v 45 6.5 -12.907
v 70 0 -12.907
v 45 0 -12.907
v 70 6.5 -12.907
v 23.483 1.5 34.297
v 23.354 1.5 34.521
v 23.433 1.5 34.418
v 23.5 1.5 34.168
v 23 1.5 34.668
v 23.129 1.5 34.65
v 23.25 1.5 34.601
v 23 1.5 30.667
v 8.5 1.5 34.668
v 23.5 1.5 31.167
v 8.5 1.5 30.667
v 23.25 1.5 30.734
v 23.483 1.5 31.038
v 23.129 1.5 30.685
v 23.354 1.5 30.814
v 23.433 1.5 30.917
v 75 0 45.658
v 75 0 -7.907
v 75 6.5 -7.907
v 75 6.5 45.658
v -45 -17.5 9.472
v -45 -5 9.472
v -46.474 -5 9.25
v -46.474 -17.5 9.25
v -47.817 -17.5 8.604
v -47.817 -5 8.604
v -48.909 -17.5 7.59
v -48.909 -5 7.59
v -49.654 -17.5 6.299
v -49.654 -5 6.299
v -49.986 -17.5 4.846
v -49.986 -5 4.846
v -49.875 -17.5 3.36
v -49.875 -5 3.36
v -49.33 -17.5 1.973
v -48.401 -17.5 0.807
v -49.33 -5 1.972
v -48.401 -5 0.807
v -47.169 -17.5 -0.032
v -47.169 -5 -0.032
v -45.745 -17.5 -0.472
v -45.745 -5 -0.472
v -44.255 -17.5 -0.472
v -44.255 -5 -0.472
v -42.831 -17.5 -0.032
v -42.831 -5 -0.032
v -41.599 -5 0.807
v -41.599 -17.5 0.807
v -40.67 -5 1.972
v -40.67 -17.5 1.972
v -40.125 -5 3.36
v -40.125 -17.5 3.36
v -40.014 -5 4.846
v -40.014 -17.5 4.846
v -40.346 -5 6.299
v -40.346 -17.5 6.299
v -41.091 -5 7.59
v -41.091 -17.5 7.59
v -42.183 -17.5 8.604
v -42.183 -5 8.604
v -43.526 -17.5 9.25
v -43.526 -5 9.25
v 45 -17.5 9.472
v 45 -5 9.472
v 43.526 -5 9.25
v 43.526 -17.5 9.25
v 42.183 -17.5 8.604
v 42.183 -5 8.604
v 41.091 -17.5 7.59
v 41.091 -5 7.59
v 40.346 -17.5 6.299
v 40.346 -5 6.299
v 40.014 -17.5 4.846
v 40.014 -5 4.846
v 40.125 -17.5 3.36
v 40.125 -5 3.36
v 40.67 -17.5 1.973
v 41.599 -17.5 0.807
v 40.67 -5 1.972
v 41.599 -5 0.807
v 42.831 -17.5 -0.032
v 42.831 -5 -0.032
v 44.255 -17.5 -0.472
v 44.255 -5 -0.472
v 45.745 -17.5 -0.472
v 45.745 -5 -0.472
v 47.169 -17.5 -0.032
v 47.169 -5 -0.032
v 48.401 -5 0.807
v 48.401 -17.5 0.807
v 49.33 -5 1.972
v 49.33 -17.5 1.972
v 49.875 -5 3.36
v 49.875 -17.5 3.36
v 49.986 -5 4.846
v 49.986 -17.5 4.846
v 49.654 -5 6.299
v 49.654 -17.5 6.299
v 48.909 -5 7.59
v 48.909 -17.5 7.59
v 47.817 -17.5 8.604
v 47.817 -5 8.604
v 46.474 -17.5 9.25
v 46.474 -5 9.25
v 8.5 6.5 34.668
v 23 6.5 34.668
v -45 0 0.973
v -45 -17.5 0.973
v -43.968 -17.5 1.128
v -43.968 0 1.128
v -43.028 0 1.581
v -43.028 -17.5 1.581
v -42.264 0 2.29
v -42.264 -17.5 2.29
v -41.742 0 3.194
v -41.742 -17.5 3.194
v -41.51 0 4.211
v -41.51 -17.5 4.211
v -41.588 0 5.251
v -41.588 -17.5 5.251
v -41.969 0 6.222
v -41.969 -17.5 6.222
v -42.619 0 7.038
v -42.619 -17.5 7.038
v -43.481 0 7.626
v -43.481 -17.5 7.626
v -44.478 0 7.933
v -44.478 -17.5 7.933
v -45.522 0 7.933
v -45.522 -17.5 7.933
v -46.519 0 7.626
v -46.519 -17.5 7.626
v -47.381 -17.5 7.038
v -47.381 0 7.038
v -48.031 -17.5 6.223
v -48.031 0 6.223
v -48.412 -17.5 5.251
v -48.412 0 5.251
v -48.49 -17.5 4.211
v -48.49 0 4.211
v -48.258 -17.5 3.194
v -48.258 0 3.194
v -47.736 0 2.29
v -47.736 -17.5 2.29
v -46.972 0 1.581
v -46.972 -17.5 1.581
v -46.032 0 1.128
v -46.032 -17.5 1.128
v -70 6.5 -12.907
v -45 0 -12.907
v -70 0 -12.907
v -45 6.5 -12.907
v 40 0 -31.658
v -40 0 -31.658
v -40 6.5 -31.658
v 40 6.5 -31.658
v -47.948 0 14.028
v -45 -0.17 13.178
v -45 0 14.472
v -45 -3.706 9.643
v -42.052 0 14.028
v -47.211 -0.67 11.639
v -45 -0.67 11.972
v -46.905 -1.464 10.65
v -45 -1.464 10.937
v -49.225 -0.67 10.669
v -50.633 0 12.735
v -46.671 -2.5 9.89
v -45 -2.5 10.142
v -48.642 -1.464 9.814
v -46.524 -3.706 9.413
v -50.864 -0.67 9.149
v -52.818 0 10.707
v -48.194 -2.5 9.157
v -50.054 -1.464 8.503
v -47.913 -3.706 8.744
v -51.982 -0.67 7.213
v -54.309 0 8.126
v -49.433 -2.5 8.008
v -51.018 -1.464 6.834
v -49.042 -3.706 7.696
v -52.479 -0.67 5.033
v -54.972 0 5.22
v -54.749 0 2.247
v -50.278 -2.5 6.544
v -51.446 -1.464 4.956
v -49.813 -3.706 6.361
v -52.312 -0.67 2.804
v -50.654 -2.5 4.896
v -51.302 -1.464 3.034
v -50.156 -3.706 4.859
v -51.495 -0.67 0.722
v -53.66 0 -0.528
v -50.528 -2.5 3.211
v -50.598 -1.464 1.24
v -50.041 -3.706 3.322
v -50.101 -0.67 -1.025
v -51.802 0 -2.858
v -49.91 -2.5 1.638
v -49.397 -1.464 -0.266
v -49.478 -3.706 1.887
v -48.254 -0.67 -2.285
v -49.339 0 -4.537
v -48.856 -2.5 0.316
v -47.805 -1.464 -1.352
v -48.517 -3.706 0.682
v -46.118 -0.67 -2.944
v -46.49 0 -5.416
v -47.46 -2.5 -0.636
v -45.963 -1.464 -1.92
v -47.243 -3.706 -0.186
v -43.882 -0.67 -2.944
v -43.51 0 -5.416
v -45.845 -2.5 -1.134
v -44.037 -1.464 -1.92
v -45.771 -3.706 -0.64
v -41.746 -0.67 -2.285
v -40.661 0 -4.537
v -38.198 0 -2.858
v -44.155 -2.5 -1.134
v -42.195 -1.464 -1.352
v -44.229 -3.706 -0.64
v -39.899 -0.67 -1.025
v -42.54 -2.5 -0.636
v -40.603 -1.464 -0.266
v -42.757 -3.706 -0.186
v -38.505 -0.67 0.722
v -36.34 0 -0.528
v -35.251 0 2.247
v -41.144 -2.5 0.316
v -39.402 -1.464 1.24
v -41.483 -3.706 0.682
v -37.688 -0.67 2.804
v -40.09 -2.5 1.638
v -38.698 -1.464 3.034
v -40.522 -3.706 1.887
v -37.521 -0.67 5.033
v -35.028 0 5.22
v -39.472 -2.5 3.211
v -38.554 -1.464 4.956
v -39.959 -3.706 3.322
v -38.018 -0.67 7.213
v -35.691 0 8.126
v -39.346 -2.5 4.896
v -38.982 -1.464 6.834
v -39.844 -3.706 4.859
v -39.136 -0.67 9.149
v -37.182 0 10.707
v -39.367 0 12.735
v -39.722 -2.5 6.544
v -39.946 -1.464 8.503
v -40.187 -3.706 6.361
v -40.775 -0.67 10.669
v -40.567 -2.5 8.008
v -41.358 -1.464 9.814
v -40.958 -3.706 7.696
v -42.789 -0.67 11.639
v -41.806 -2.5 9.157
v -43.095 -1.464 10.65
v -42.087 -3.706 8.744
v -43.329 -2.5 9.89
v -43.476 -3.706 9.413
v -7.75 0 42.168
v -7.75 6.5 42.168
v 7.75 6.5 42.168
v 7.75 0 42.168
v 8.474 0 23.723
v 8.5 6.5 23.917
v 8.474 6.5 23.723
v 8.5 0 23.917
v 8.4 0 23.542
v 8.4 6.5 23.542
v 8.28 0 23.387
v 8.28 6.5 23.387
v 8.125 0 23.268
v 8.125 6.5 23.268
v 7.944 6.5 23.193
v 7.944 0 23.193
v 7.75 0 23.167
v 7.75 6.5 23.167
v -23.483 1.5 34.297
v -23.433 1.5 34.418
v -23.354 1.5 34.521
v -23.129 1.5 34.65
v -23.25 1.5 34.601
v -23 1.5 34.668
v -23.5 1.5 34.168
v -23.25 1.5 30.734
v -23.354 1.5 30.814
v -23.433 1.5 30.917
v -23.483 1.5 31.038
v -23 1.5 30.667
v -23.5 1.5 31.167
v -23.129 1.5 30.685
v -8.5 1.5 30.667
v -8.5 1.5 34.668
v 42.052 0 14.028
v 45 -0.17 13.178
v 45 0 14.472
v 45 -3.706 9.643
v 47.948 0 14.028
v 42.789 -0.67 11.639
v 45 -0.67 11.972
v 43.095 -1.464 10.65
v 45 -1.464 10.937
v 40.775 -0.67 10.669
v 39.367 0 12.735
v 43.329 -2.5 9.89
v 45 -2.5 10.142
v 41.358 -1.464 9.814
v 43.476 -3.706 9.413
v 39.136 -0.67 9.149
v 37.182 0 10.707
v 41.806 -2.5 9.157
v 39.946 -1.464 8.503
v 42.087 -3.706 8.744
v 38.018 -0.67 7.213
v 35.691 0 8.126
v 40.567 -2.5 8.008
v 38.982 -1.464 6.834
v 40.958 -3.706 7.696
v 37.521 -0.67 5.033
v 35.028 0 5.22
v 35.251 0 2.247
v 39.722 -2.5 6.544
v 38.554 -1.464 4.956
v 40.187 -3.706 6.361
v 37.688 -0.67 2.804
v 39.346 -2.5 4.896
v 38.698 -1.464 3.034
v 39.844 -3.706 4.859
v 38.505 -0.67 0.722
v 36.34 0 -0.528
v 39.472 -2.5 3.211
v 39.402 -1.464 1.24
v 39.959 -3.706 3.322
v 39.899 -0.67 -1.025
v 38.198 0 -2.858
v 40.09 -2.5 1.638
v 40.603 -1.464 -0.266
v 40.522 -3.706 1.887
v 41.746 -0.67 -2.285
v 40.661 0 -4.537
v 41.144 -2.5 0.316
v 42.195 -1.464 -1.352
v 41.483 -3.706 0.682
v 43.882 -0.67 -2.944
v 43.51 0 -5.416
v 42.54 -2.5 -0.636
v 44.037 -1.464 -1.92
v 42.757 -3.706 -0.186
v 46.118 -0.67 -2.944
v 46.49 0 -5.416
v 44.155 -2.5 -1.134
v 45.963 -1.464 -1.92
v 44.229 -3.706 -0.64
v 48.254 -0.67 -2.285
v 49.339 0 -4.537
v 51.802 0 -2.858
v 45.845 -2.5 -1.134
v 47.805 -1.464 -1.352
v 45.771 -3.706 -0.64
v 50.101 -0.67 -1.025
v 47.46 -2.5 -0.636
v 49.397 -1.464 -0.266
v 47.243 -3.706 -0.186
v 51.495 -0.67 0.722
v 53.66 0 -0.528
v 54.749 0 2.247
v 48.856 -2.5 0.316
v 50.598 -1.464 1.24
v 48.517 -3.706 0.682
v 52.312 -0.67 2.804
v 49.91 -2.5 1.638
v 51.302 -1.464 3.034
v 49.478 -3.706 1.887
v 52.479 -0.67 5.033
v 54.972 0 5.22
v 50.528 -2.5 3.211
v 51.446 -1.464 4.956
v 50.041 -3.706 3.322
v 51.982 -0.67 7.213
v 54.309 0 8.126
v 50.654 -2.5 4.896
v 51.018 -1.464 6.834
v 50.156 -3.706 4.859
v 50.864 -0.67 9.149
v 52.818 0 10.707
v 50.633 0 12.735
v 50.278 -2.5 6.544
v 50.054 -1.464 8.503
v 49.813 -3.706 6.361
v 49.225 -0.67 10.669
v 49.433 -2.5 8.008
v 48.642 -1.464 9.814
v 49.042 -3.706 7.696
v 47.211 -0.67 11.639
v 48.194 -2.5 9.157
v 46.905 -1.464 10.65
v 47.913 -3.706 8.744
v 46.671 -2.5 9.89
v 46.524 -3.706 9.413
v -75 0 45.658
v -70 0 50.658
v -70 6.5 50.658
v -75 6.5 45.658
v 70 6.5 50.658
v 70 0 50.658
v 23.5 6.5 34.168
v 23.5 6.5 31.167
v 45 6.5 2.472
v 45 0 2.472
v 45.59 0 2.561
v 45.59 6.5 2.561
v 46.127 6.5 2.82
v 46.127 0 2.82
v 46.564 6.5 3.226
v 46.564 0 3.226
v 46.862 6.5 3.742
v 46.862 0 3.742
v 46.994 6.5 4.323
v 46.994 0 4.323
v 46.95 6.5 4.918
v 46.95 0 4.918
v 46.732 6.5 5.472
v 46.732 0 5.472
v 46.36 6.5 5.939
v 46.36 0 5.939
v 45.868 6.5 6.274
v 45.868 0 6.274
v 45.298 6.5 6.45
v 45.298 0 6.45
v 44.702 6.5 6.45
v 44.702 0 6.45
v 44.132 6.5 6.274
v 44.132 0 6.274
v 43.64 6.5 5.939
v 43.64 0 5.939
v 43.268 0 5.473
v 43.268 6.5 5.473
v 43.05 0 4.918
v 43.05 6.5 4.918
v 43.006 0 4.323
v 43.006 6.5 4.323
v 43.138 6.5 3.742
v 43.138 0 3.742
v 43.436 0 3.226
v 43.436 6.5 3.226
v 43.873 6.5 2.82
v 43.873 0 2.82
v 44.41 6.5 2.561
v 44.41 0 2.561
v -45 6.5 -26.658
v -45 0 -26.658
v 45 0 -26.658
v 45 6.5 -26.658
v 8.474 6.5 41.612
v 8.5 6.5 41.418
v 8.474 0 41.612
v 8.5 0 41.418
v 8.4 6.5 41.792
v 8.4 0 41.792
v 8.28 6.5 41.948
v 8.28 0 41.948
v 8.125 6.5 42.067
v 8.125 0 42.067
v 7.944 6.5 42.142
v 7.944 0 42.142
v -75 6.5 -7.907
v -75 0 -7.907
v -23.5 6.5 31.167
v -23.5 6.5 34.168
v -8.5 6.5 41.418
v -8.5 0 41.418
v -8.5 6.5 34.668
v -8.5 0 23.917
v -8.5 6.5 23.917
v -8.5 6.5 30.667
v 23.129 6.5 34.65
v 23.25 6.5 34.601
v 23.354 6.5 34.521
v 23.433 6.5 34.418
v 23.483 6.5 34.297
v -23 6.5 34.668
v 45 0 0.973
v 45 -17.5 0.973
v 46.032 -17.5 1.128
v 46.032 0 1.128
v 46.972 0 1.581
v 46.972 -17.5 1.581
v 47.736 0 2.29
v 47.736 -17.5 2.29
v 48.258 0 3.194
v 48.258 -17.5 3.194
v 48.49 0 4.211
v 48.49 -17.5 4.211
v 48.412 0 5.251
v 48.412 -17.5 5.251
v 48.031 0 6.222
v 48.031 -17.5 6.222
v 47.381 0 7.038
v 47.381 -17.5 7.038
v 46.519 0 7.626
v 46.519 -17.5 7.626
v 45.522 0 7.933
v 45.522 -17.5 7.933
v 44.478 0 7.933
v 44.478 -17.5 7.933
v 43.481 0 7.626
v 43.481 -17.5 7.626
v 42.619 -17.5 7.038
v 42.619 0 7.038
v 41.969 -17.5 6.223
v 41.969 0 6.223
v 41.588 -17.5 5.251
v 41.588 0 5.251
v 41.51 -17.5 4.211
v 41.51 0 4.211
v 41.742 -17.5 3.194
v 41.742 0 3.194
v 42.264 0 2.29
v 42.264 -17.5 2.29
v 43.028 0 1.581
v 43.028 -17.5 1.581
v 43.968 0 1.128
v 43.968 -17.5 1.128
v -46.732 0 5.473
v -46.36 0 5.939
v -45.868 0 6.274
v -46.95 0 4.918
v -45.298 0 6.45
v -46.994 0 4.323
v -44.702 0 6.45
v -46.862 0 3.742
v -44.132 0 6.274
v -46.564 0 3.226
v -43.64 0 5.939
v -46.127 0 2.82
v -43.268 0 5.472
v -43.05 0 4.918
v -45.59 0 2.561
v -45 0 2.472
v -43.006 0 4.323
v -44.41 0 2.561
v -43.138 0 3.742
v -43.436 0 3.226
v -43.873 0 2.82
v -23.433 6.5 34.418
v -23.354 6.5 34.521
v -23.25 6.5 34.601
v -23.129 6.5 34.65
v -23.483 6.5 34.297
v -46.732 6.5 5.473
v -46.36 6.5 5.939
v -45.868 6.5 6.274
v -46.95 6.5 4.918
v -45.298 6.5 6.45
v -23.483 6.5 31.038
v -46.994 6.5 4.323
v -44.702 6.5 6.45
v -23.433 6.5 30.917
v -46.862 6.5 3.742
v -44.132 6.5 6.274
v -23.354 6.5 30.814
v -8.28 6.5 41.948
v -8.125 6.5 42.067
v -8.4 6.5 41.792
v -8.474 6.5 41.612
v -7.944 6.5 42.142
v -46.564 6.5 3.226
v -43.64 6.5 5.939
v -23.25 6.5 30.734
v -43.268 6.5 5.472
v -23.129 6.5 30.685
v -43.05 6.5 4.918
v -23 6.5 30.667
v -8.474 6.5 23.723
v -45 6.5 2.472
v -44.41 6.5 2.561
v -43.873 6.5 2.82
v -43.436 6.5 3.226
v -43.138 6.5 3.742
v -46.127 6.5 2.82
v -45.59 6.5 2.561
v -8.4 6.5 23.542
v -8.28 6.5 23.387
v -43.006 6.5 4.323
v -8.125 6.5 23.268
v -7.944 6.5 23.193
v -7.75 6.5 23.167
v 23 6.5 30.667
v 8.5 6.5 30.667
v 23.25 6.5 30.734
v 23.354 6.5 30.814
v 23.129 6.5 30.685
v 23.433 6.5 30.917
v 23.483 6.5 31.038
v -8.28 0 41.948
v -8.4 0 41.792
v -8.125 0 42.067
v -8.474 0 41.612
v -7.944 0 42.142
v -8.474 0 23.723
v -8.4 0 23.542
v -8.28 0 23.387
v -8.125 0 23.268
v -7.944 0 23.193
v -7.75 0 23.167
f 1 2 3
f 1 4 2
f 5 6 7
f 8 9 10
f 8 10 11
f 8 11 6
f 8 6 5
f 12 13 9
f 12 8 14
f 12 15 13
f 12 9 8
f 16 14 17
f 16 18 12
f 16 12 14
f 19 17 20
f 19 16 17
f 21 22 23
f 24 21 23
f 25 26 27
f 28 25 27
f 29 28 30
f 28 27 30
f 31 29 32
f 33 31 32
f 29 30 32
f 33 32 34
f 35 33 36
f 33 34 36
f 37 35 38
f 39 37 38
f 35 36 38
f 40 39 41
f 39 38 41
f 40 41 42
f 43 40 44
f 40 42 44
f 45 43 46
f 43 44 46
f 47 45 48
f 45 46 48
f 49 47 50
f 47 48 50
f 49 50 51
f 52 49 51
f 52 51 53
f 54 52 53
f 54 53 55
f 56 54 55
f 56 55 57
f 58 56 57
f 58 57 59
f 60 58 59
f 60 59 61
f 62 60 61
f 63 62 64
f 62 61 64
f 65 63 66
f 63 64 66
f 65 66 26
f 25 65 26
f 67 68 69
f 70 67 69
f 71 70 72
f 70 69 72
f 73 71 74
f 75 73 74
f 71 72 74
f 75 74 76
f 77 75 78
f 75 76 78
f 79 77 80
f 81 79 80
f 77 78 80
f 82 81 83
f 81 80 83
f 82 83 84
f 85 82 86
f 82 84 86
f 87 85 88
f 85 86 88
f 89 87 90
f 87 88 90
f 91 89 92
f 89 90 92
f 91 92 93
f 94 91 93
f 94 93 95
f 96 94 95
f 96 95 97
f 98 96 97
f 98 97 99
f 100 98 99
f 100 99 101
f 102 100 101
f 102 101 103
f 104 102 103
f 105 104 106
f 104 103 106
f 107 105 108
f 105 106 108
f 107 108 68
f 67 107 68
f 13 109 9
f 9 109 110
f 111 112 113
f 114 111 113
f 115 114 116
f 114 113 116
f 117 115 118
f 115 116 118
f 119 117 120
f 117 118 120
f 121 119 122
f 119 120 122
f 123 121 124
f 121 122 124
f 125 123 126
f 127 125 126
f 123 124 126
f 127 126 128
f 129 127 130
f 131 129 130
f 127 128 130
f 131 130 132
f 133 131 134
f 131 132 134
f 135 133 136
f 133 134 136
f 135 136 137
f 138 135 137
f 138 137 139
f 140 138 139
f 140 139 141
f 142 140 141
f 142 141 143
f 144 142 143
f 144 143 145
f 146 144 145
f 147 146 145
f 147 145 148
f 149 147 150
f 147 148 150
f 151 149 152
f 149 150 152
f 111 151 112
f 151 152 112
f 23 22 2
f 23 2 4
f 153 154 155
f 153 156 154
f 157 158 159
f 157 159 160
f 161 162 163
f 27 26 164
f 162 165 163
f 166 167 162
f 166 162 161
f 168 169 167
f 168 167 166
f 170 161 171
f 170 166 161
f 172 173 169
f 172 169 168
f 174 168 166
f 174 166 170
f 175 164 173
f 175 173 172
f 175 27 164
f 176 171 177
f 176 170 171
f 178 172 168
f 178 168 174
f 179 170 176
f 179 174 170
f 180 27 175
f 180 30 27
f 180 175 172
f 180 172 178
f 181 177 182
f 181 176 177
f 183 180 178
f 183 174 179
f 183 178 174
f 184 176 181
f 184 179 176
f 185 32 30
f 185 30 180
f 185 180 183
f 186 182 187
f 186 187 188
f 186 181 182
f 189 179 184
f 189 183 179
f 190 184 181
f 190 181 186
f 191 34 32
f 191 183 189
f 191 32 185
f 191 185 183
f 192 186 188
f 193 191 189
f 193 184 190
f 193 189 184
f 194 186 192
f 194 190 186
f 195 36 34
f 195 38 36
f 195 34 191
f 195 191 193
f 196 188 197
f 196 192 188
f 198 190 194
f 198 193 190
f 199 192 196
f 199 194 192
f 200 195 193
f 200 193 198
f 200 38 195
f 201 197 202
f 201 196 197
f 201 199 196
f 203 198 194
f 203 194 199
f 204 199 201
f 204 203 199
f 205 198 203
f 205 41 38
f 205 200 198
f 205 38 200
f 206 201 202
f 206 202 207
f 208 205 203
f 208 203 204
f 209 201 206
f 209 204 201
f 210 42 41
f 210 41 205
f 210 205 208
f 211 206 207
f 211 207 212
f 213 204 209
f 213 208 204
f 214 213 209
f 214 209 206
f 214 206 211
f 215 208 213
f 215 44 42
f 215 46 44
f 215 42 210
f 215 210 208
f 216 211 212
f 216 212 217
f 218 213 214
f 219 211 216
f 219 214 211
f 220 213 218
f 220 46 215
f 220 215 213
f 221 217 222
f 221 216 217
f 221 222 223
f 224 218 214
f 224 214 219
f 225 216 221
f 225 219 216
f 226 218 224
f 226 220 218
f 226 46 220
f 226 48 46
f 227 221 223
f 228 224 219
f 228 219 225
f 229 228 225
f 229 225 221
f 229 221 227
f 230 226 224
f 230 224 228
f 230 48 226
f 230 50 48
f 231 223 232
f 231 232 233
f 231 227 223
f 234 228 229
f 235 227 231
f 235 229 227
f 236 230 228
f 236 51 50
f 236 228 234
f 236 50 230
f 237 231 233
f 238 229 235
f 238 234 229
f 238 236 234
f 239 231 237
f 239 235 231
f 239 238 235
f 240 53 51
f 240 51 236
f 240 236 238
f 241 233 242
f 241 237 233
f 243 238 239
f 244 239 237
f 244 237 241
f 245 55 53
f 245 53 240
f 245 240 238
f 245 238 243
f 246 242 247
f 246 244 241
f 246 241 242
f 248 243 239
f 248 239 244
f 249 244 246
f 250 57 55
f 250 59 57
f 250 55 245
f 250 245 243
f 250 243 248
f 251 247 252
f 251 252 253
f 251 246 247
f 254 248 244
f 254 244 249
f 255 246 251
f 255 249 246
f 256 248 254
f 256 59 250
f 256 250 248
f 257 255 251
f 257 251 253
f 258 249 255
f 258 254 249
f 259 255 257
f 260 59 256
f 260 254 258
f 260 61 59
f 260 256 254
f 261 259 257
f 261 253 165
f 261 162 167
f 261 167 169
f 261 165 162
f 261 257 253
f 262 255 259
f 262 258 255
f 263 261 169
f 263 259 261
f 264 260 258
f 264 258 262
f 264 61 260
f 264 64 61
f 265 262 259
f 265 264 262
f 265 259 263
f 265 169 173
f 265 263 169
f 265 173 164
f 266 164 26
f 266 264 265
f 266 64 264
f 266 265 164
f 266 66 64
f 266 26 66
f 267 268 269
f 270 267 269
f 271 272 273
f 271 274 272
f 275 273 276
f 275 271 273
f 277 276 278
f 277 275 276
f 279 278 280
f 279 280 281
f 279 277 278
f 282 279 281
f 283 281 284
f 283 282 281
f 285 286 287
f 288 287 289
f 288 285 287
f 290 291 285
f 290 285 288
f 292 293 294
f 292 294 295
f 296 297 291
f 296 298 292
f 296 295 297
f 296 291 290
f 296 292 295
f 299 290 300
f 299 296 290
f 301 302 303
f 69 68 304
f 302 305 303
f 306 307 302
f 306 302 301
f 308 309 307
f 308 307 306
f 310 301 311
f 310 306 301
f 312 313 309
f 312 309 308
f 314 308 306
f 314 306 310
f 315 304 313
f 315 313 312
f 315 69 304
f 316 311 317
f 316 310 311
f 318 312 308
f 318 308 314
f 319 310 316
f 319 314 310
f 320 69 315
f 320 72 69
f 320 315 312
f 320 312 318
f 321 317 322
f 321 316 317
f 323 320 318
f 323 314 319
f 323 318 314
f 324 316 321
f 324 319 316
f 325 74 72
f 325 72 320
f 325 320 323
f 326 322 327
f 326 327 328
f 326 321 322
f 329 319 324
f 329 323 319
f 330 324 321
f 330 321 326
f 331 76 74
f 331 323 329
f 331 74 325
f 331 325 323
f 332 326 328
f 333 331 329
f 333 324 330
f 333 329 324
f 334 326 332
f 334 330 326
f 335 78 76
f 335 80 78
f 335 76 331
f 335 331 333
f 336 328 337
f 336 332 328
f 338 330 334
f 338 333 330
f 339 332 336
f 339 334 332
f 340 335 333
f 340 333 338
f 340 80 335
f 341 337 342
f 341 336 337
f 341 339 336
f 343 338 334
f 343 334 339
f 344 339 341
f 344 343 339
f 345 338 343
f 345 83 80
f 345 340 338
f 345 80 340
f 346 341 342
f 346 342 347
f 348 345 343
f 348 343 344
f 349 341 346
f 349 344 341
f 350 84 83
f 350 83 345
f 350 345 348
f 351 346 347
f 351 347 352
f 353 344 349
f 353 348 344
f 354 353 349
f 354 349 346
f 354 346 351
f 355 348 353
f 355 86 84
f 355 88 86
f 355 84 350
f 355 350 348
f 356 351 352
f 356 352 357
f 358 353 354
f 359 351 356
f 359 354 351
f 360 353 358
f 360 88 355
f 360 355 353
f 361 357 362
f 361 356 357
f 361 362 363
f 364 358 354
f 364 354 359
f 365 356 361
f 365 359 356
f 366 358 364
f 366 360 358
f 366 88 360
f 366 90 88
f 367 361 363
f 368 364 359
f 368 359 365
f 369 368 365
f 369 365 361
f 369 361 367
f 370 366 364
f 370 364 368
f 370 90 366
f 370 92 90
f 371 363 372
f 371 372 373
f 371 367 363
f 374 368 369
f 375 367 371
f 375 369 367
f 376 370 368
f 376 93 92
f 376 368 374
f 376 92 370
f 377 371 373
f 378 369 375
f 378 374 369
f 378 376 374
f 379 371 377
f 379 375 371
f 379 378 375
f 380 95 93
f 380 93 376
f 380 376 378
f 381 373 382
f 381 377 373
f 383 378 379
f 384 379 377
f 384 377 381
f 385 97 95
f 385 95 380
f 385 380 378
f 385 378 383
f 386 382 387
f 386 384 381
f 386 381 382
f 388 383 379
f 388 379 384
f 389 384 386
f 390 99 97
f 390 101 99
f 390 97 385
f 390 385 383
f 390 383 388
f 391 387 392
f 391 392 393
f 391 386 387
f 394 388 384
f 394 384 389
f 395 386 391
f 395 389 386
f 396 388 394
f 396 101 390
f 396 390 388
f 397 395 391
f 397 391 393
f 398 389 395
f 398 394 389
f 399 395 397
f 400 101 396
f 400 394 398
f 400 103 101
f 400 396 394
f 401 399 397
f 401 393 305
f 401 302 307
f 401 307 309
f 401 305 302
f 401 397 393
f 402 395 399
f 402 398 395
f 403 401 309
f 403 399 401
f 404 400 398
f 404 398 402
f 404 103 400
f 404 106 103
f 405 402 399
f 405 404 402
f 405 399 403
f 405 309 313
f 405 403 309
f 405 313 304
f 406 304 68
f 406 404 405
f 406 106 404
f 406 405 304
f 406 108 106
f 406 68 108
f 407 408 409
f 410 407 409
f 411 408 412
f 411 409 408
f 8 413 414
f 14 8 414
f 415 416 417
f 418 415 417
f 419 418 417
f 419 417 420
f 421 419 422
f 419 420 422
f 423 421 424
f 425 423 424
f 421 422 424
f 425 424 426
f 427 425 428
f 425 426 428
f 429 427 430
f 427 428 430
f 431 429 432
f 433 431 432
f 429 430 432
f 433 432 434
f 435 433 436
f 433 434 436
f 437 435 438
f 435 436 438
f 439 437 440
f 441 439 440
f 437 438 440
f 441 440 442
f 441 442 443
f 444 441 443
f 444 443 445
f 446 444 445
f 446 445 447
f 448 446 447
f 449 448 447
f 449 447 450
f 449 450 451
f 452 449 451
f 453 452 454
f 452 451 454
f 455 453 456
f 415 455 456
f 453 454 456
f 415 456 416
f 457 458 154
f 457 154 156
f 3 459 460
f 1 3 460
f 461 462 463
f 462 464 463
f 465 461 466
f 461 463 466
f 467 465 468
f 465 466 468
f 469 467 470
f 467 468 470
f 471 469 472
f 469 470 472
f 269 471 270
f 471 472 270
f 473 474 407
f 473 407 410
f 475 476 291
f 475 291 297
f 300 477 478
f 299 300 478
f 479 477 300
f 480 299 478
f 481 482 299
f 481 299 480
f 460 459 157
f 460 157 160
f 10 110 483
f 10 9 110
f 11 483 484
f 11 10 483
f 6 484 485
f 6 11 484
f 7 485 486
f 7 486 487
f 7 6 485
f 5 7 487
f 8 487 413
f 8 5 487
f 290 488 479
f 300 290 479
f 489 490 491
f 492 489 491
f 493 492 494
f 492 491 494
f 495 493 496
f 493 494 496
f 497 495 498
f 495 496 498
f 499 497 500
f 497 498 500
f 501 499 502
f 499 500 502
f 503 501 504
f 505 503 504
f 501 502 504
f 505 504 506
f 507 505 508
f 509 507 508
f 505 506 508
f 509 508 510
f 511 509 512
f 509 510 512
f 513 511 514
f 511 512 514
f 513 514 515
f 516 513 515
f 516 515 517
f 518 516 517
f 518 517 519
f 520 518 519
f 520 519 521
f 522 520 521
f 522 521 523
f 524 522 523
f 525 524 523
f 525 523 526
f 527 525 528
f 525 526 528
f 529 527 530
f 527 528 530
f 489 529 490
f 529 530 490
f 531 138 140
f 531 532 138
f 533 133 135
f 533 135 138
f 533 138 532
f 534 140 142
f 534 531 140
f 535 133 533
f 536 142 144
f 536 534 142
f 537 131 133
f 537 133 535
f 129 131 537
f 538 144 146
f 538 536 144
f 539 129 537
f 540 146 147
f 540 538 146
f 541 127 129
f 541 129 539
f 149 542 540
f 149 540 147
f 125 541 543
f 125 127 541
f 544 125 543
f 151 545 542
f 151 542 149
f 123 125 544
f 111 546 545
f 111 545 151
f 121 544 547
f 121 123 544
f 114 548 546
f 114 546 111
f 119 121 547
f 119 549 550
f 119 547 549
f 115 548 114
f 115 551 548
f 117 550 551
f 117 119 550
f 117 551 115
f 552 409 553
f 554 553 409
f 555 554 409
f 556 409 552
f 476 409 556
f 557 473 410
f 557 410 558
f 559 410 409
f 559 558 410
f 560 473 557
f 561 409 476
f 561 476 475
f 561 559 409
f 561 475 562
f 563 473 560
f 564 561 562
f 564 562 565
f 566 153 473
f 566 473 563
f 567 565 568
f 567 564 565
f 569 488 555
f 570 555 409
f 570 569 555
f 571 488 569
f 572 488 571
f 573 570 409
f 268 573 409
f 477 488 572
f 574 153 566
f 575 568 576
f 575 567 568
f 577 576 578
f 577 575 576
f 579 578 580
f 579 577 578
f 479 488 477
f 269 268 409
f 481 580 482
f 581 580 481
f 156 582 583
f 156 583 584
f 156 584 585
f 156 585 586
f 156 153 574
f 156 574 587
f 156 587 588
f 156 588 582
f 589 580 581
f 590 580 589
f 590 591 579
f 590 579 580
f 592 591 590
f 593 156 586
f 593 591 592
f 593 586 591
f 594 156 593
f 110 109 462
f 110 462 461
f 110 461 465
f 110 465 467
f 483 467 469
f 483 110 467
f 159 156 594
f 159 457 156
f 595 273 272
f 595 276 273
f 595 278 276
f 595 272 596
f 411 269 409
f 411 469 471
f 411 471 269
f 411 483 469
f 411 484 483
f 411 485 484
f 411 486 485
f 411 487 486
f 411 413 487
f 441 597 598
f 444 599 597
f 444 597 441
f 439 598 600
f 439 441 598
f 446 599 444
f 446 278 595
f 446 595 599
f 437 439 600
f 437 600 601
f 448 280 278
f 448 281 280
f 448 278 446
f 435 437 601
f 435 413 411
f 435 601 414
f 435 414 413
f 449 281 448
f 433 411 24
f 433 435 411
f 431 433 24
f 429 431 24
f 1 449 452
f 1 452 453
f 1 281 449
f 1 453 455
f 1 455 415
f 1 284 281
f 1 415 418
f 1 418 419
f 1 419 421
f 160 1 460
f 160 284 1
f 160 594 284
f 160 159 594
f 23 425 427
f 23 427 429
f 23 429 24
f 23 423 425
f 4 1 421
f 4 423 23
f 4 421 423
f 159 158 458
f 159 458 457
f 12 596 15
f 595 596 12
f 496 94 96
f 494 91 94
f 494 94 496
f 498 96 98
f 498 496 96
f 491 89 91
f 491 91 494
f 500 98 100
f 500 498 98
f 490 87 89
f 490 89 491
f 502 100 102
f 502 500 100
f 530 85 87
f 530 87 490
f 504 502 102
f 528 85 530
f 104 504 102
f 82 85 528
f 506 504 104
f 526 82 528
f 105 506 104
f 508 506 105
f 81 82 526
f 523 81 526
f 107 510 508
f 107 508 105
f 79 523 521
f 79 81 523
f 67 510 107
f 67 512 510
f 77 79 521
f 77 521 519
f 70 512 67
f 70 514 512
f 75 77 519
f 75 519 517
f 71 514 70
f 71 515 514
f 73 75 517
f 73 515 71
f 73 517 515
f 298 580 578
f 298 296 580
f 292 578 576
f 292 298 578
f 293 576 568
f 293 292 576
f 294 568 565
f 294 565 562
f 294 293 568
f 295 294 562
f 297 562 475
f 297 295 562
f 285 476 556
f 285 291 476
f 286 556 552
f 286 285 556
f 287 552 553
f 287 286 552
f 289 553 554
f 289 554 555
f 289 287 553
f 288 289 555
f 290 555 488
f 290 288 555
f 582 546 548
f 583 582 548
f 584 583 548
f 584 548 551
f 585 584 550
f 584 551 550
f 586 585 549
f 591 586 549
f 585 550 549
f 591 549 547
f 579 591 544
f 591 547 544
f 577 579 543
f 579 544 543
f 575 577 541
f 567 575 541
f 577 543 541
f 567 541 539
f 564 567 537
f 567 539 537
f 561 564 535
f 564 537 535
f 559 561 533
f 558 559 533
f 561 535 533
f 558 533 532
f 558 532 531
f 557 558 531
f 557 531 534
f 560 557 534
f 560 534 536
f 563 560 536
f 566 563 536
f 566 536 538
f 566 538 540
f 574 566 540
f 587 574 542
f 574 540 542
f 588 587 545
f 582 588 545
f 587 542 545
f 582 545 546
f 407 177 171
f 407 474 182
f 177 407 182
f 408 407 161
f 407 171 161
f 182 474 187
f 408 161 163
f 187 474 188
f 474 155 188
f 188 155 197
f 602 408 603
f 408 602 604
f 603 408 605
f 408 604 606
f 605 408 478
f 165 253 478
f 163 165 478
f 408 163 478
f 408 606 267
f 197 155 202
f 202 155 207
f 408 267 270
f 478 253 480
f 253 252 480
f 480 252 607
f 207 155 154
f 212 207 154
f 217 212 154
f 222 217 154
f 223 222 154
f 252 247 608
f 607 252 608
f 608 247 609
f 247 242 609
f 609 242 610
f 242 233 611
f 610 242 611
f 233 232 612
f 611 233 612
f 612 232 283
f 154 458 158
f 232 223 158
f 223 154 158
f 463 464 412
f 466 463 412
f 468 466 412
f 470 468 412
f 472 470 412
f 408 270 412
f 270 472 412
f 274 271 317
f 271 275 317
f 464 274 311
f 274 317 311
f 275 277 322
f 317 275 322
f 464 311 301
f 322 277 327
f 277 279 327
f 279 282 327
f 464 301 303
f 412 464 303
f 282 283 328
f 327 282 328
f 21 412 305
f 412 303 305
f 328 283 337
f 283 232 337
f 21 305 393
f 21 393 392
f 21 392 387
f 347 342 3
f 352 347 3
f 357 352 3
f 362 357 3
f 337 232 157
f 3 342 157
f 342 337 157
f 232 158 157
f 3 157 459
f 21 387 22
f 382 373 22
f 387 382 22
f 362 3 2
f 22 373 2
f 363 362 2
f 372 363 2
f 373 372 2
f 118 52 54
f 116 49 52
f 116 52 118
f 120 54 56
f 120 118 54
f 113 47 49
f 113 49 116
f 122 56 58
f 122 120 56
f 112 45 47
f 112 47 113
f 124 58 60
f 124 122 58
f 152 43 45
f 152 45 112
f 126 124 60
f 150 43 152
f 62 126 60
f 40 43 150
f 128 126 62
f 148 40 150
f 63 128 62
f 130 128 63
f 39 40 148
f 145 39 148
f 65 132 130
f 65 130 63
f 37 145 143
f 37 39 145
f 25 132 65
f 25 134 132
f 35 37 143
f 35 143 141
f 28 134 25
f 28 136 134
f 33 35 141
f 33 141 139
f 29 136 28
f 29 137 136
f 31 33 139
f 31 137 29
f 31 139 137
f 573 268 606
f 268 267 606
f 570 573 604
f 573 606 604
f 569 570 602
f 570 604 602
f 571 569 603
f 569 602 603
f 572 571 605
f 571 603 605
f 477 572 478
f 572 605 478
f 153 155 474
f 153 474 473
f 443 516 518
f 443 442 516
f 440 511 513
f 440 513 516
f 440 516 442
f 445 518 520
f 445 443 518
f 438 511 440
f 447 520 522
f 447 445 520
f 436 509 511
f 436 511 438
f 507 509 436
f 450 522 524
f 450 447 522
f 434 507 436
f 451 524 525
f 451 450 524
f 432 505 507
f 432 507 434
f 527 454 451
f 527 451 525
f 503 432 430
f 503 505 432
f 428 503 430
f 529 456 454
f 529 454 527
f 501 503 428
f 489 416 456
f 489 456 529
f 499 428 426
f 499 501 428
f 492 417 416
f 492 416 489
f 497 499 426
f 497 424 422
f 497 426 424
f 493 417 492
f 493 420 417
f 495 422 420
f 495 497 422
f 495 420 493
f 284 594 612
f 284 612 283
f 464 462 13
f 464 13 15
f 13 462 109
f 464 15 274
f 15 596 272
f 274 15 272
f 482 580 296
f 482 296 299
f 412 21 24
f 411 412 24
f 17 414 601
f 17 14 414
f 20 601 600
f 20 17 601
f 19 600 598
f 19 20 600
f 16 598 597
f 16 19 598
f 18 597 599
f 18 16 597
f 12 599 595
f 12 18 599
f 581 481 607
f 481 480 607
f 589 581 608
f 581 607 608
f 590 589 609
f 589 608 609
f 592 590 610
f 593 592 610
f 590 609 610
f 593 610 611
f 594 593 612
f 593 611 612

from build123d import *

# Parameters (mm, degrees)
SKETCH1_W           = 150
SKETCH1_H           = 63.315
BOSS_EXTRUDE1_DEPTH = 6.5
SKETCH3_W           = 30
SKETCH3_H           = 6.5
CUT_EXTRUDE1_DEPTH  = 18.75
CHAMFER1_SIZE       = 5
SKETCH5_R           = 5
BOSS_EXTRUDE3_DEPTH = 17.5
FILLET1_R           = 5
SKETCH6_R           = 3.5
CUT_EXTRUDE2_DEPTH  = 17.5
SKETCH7_R           = 3.5
CUT_EXTRUDE3_DEPTH  = 17.5
SKETCH8_R           = 2
CUT_EXTRUDE4_DEPTH  = 6.5
SKETCH11_W          = 150
SKETCH11_H          = 6.5
BOSS_EXTRUDE4_DEPTH = 19
SKETCH12_W          = 17
SKETCH12_H          = 19
CUT_EXTRUDE5_DEPTH  = 19
SKETCH13_W          = 15
SKETCH13_H          = 4
CUT_EXTRUDE6_DEPTH  = 5
FILLET2_R           = 0.5
FILLET3_R           = 0.75
CHAMFER2_SIZE       = 5


with BuildPart() as part:
    # Sketch1 → Boss-Extrude1 (new body)
    with BuildSketch(Plane(origin=(0, 0, 0), x_dir=(1, 0, 0), z_dir=(0, 1, 0))):
        Rectangle(SKETCH1_W, SKETCH1_H)
    extrude(amount=BOSS_EXTRUDE1_DEPTH)

    # Sketch3 → Cut-Extrude1 (cut)
    with BuildSketch(Plane(origin=(0, 0, -31.6575), x_dir=(-1, 0, 0), z_dir=(0, 0, -1))):
        with Locations((-60, 3.25)):
            Rectangle(SKETCH3_W, SKETCH3_H)
        with Locations((60, 3.25)):
            Rectangle(SKETCH3_W, SKETCH3_H)
    extrude(amount=-CUT_EXTRUDE1_DEPTH, mode=Mode.SUBTRACT)

    # Chamfer1
    chamfer1_edges = [part.edges().sort_by_distance(p)[0] for p in [
        (75, 3.25, -12.9075),
        (45, 3.25, -31.6575),
        (-75, 3.25, -12.9075),
        (-45, 3.25, -31.6575),
    ]]
    chamfer(chamfer1_edges, length=CHAMFER1_SIZE)

    # Sketch5 → Boss-Extrude3 (add)
    with BuildSketch(Plane.XZ):
        with Locations(Location((45, 4.4725, 0), (0, 0, 90))):
            Circle(SKETCH5_R)
        with Locations(Location((-45, 4.4725, 0), (0, 0, 90))):
            Circle(SKETCH5_R)
    extrude(amount=BOSS_EXTRUDE3_DEPTH)

    # Fillet1
    fillet1_edges = [part.edges().sort_by_distance(p)[0] for p in [
        (45, 0, -0.5275),
        (-45, 0, -0.5275),
    ]]
    fillet(fillet1_edges, radius=FILLET1_R)

    # Sketch6 → Cut-Extrude2 (cut)
    with BuildSketch(Plane.XZ.offset(17.5)):
        with Locations(Location((45, 4.4725, 0), (0, 0, 270))):
            Circle(SKETCH6_R)
    extrude(amount=-CUT_EXTRUDE2_DEPTH, mode=Mode.SUBTRACT)

    # Sketch7 → Cut-Extrude3 (cut)
    with BuildSketch(Plane.XZ.offset(17.5)):
        with Locations(Location((-45, 4.4725, 0), (0, 0, 270))):
            Circle(SKETCH7_R)
    extrude(amount=-CUT_EXTRUDE3_DEPTH, mode=Mode.SUBTRACT)

    # Sketch8 → Cut-Extrude4 (cut)
    with BuildSketch(Plane.XZ):
        with Locations(Location((45, 4.4725, 0), (0, 0, 270))):
            Circle(SKETCH8_R)
        with Locations(Location((-45, 4.4725, 0), (0, 0, 270))):
            Circle(SKETCH8_R)
    extrude(amount=-CUT_EXTRUDE4_DEPTH, mode=Mode.SUBTRACT)

    # Sketch11 → Boss-Extrude4 (add)
    with BuildSketch(Plane.XY.offset(31.6575)):
        with Locations((0, 3.25)):
            Rectangle(SKETCH11_W, SKETCH11_H)
    extrude(amount=BOSS_EXTRUDE4_DEPTH)

    # Sketch12 → Cut-Extrude5 (cut)
    with BuildSketch(Plane(origin=(0, 6.5, 0), x_dir=(1, 0, 0), z_dir=(0, 1, 0))):
        with Locations((0, -32.6675)):
            Rectangle(SKETCH12_W, SKETCH12_H)
    extrude(amount=-CUT_EXTRUDE5_DEPTH, mode=Mode.SUBTRACT)

    # Sketch13 → Cut-Extrude6 (cut)
    with BuildSketch(Plane(origin=(0, 6.5, 0), x_dir=(1, 0, 0), z_dir=(0, 1, 0))):
        with Locations((-16, -32.6675)):
            Rectangle(SKETCH13_W, SKETCH13_H)
        with Locations((16, -32.6675)):
            Rectangle(SKETCH13_W, SKETCH13_H)
    extrude(amount=-CUT_EXTRUDE6_DEPTH, mode=Mode.SUBTRACT)

    # Fillet2
    fillet2_edges = [part.edges().sort_by_distance(p)[0] for p in [
        (-23.5, 4, 34.6675),
        (-23.5, 4, 30.6675),
        (23.5, 4, 30.6675),
        (23.5, 4, 34.6675),
    ]]
    fillet(fillet2_edges, radius=FILLET2_R)

    # Fillet3
    fillet3_edges = [part.edges().sort_by_distance(p)[0] for p in [
        (8.5, 3.25, 42.1675),
        (-8.5, 3.25, 42.1675),
        (-8.5, 3.25, 23.1675),
        (8.5, 3.25, 23.1675),
    ]]
    fillet(fillet3_edges, radius=FILLET3_R)

    # Chamfer2
    chamfer2_edges = [part.edges().sort_by_distance(p)[0] for p in [
        (-75, 3.25, 50.6575),
        (75, 3.25, 50.6575),
    ]]
    chamfer(chamfer2_edges, length=CHAMFER2_SIZE)


solid = part.part
